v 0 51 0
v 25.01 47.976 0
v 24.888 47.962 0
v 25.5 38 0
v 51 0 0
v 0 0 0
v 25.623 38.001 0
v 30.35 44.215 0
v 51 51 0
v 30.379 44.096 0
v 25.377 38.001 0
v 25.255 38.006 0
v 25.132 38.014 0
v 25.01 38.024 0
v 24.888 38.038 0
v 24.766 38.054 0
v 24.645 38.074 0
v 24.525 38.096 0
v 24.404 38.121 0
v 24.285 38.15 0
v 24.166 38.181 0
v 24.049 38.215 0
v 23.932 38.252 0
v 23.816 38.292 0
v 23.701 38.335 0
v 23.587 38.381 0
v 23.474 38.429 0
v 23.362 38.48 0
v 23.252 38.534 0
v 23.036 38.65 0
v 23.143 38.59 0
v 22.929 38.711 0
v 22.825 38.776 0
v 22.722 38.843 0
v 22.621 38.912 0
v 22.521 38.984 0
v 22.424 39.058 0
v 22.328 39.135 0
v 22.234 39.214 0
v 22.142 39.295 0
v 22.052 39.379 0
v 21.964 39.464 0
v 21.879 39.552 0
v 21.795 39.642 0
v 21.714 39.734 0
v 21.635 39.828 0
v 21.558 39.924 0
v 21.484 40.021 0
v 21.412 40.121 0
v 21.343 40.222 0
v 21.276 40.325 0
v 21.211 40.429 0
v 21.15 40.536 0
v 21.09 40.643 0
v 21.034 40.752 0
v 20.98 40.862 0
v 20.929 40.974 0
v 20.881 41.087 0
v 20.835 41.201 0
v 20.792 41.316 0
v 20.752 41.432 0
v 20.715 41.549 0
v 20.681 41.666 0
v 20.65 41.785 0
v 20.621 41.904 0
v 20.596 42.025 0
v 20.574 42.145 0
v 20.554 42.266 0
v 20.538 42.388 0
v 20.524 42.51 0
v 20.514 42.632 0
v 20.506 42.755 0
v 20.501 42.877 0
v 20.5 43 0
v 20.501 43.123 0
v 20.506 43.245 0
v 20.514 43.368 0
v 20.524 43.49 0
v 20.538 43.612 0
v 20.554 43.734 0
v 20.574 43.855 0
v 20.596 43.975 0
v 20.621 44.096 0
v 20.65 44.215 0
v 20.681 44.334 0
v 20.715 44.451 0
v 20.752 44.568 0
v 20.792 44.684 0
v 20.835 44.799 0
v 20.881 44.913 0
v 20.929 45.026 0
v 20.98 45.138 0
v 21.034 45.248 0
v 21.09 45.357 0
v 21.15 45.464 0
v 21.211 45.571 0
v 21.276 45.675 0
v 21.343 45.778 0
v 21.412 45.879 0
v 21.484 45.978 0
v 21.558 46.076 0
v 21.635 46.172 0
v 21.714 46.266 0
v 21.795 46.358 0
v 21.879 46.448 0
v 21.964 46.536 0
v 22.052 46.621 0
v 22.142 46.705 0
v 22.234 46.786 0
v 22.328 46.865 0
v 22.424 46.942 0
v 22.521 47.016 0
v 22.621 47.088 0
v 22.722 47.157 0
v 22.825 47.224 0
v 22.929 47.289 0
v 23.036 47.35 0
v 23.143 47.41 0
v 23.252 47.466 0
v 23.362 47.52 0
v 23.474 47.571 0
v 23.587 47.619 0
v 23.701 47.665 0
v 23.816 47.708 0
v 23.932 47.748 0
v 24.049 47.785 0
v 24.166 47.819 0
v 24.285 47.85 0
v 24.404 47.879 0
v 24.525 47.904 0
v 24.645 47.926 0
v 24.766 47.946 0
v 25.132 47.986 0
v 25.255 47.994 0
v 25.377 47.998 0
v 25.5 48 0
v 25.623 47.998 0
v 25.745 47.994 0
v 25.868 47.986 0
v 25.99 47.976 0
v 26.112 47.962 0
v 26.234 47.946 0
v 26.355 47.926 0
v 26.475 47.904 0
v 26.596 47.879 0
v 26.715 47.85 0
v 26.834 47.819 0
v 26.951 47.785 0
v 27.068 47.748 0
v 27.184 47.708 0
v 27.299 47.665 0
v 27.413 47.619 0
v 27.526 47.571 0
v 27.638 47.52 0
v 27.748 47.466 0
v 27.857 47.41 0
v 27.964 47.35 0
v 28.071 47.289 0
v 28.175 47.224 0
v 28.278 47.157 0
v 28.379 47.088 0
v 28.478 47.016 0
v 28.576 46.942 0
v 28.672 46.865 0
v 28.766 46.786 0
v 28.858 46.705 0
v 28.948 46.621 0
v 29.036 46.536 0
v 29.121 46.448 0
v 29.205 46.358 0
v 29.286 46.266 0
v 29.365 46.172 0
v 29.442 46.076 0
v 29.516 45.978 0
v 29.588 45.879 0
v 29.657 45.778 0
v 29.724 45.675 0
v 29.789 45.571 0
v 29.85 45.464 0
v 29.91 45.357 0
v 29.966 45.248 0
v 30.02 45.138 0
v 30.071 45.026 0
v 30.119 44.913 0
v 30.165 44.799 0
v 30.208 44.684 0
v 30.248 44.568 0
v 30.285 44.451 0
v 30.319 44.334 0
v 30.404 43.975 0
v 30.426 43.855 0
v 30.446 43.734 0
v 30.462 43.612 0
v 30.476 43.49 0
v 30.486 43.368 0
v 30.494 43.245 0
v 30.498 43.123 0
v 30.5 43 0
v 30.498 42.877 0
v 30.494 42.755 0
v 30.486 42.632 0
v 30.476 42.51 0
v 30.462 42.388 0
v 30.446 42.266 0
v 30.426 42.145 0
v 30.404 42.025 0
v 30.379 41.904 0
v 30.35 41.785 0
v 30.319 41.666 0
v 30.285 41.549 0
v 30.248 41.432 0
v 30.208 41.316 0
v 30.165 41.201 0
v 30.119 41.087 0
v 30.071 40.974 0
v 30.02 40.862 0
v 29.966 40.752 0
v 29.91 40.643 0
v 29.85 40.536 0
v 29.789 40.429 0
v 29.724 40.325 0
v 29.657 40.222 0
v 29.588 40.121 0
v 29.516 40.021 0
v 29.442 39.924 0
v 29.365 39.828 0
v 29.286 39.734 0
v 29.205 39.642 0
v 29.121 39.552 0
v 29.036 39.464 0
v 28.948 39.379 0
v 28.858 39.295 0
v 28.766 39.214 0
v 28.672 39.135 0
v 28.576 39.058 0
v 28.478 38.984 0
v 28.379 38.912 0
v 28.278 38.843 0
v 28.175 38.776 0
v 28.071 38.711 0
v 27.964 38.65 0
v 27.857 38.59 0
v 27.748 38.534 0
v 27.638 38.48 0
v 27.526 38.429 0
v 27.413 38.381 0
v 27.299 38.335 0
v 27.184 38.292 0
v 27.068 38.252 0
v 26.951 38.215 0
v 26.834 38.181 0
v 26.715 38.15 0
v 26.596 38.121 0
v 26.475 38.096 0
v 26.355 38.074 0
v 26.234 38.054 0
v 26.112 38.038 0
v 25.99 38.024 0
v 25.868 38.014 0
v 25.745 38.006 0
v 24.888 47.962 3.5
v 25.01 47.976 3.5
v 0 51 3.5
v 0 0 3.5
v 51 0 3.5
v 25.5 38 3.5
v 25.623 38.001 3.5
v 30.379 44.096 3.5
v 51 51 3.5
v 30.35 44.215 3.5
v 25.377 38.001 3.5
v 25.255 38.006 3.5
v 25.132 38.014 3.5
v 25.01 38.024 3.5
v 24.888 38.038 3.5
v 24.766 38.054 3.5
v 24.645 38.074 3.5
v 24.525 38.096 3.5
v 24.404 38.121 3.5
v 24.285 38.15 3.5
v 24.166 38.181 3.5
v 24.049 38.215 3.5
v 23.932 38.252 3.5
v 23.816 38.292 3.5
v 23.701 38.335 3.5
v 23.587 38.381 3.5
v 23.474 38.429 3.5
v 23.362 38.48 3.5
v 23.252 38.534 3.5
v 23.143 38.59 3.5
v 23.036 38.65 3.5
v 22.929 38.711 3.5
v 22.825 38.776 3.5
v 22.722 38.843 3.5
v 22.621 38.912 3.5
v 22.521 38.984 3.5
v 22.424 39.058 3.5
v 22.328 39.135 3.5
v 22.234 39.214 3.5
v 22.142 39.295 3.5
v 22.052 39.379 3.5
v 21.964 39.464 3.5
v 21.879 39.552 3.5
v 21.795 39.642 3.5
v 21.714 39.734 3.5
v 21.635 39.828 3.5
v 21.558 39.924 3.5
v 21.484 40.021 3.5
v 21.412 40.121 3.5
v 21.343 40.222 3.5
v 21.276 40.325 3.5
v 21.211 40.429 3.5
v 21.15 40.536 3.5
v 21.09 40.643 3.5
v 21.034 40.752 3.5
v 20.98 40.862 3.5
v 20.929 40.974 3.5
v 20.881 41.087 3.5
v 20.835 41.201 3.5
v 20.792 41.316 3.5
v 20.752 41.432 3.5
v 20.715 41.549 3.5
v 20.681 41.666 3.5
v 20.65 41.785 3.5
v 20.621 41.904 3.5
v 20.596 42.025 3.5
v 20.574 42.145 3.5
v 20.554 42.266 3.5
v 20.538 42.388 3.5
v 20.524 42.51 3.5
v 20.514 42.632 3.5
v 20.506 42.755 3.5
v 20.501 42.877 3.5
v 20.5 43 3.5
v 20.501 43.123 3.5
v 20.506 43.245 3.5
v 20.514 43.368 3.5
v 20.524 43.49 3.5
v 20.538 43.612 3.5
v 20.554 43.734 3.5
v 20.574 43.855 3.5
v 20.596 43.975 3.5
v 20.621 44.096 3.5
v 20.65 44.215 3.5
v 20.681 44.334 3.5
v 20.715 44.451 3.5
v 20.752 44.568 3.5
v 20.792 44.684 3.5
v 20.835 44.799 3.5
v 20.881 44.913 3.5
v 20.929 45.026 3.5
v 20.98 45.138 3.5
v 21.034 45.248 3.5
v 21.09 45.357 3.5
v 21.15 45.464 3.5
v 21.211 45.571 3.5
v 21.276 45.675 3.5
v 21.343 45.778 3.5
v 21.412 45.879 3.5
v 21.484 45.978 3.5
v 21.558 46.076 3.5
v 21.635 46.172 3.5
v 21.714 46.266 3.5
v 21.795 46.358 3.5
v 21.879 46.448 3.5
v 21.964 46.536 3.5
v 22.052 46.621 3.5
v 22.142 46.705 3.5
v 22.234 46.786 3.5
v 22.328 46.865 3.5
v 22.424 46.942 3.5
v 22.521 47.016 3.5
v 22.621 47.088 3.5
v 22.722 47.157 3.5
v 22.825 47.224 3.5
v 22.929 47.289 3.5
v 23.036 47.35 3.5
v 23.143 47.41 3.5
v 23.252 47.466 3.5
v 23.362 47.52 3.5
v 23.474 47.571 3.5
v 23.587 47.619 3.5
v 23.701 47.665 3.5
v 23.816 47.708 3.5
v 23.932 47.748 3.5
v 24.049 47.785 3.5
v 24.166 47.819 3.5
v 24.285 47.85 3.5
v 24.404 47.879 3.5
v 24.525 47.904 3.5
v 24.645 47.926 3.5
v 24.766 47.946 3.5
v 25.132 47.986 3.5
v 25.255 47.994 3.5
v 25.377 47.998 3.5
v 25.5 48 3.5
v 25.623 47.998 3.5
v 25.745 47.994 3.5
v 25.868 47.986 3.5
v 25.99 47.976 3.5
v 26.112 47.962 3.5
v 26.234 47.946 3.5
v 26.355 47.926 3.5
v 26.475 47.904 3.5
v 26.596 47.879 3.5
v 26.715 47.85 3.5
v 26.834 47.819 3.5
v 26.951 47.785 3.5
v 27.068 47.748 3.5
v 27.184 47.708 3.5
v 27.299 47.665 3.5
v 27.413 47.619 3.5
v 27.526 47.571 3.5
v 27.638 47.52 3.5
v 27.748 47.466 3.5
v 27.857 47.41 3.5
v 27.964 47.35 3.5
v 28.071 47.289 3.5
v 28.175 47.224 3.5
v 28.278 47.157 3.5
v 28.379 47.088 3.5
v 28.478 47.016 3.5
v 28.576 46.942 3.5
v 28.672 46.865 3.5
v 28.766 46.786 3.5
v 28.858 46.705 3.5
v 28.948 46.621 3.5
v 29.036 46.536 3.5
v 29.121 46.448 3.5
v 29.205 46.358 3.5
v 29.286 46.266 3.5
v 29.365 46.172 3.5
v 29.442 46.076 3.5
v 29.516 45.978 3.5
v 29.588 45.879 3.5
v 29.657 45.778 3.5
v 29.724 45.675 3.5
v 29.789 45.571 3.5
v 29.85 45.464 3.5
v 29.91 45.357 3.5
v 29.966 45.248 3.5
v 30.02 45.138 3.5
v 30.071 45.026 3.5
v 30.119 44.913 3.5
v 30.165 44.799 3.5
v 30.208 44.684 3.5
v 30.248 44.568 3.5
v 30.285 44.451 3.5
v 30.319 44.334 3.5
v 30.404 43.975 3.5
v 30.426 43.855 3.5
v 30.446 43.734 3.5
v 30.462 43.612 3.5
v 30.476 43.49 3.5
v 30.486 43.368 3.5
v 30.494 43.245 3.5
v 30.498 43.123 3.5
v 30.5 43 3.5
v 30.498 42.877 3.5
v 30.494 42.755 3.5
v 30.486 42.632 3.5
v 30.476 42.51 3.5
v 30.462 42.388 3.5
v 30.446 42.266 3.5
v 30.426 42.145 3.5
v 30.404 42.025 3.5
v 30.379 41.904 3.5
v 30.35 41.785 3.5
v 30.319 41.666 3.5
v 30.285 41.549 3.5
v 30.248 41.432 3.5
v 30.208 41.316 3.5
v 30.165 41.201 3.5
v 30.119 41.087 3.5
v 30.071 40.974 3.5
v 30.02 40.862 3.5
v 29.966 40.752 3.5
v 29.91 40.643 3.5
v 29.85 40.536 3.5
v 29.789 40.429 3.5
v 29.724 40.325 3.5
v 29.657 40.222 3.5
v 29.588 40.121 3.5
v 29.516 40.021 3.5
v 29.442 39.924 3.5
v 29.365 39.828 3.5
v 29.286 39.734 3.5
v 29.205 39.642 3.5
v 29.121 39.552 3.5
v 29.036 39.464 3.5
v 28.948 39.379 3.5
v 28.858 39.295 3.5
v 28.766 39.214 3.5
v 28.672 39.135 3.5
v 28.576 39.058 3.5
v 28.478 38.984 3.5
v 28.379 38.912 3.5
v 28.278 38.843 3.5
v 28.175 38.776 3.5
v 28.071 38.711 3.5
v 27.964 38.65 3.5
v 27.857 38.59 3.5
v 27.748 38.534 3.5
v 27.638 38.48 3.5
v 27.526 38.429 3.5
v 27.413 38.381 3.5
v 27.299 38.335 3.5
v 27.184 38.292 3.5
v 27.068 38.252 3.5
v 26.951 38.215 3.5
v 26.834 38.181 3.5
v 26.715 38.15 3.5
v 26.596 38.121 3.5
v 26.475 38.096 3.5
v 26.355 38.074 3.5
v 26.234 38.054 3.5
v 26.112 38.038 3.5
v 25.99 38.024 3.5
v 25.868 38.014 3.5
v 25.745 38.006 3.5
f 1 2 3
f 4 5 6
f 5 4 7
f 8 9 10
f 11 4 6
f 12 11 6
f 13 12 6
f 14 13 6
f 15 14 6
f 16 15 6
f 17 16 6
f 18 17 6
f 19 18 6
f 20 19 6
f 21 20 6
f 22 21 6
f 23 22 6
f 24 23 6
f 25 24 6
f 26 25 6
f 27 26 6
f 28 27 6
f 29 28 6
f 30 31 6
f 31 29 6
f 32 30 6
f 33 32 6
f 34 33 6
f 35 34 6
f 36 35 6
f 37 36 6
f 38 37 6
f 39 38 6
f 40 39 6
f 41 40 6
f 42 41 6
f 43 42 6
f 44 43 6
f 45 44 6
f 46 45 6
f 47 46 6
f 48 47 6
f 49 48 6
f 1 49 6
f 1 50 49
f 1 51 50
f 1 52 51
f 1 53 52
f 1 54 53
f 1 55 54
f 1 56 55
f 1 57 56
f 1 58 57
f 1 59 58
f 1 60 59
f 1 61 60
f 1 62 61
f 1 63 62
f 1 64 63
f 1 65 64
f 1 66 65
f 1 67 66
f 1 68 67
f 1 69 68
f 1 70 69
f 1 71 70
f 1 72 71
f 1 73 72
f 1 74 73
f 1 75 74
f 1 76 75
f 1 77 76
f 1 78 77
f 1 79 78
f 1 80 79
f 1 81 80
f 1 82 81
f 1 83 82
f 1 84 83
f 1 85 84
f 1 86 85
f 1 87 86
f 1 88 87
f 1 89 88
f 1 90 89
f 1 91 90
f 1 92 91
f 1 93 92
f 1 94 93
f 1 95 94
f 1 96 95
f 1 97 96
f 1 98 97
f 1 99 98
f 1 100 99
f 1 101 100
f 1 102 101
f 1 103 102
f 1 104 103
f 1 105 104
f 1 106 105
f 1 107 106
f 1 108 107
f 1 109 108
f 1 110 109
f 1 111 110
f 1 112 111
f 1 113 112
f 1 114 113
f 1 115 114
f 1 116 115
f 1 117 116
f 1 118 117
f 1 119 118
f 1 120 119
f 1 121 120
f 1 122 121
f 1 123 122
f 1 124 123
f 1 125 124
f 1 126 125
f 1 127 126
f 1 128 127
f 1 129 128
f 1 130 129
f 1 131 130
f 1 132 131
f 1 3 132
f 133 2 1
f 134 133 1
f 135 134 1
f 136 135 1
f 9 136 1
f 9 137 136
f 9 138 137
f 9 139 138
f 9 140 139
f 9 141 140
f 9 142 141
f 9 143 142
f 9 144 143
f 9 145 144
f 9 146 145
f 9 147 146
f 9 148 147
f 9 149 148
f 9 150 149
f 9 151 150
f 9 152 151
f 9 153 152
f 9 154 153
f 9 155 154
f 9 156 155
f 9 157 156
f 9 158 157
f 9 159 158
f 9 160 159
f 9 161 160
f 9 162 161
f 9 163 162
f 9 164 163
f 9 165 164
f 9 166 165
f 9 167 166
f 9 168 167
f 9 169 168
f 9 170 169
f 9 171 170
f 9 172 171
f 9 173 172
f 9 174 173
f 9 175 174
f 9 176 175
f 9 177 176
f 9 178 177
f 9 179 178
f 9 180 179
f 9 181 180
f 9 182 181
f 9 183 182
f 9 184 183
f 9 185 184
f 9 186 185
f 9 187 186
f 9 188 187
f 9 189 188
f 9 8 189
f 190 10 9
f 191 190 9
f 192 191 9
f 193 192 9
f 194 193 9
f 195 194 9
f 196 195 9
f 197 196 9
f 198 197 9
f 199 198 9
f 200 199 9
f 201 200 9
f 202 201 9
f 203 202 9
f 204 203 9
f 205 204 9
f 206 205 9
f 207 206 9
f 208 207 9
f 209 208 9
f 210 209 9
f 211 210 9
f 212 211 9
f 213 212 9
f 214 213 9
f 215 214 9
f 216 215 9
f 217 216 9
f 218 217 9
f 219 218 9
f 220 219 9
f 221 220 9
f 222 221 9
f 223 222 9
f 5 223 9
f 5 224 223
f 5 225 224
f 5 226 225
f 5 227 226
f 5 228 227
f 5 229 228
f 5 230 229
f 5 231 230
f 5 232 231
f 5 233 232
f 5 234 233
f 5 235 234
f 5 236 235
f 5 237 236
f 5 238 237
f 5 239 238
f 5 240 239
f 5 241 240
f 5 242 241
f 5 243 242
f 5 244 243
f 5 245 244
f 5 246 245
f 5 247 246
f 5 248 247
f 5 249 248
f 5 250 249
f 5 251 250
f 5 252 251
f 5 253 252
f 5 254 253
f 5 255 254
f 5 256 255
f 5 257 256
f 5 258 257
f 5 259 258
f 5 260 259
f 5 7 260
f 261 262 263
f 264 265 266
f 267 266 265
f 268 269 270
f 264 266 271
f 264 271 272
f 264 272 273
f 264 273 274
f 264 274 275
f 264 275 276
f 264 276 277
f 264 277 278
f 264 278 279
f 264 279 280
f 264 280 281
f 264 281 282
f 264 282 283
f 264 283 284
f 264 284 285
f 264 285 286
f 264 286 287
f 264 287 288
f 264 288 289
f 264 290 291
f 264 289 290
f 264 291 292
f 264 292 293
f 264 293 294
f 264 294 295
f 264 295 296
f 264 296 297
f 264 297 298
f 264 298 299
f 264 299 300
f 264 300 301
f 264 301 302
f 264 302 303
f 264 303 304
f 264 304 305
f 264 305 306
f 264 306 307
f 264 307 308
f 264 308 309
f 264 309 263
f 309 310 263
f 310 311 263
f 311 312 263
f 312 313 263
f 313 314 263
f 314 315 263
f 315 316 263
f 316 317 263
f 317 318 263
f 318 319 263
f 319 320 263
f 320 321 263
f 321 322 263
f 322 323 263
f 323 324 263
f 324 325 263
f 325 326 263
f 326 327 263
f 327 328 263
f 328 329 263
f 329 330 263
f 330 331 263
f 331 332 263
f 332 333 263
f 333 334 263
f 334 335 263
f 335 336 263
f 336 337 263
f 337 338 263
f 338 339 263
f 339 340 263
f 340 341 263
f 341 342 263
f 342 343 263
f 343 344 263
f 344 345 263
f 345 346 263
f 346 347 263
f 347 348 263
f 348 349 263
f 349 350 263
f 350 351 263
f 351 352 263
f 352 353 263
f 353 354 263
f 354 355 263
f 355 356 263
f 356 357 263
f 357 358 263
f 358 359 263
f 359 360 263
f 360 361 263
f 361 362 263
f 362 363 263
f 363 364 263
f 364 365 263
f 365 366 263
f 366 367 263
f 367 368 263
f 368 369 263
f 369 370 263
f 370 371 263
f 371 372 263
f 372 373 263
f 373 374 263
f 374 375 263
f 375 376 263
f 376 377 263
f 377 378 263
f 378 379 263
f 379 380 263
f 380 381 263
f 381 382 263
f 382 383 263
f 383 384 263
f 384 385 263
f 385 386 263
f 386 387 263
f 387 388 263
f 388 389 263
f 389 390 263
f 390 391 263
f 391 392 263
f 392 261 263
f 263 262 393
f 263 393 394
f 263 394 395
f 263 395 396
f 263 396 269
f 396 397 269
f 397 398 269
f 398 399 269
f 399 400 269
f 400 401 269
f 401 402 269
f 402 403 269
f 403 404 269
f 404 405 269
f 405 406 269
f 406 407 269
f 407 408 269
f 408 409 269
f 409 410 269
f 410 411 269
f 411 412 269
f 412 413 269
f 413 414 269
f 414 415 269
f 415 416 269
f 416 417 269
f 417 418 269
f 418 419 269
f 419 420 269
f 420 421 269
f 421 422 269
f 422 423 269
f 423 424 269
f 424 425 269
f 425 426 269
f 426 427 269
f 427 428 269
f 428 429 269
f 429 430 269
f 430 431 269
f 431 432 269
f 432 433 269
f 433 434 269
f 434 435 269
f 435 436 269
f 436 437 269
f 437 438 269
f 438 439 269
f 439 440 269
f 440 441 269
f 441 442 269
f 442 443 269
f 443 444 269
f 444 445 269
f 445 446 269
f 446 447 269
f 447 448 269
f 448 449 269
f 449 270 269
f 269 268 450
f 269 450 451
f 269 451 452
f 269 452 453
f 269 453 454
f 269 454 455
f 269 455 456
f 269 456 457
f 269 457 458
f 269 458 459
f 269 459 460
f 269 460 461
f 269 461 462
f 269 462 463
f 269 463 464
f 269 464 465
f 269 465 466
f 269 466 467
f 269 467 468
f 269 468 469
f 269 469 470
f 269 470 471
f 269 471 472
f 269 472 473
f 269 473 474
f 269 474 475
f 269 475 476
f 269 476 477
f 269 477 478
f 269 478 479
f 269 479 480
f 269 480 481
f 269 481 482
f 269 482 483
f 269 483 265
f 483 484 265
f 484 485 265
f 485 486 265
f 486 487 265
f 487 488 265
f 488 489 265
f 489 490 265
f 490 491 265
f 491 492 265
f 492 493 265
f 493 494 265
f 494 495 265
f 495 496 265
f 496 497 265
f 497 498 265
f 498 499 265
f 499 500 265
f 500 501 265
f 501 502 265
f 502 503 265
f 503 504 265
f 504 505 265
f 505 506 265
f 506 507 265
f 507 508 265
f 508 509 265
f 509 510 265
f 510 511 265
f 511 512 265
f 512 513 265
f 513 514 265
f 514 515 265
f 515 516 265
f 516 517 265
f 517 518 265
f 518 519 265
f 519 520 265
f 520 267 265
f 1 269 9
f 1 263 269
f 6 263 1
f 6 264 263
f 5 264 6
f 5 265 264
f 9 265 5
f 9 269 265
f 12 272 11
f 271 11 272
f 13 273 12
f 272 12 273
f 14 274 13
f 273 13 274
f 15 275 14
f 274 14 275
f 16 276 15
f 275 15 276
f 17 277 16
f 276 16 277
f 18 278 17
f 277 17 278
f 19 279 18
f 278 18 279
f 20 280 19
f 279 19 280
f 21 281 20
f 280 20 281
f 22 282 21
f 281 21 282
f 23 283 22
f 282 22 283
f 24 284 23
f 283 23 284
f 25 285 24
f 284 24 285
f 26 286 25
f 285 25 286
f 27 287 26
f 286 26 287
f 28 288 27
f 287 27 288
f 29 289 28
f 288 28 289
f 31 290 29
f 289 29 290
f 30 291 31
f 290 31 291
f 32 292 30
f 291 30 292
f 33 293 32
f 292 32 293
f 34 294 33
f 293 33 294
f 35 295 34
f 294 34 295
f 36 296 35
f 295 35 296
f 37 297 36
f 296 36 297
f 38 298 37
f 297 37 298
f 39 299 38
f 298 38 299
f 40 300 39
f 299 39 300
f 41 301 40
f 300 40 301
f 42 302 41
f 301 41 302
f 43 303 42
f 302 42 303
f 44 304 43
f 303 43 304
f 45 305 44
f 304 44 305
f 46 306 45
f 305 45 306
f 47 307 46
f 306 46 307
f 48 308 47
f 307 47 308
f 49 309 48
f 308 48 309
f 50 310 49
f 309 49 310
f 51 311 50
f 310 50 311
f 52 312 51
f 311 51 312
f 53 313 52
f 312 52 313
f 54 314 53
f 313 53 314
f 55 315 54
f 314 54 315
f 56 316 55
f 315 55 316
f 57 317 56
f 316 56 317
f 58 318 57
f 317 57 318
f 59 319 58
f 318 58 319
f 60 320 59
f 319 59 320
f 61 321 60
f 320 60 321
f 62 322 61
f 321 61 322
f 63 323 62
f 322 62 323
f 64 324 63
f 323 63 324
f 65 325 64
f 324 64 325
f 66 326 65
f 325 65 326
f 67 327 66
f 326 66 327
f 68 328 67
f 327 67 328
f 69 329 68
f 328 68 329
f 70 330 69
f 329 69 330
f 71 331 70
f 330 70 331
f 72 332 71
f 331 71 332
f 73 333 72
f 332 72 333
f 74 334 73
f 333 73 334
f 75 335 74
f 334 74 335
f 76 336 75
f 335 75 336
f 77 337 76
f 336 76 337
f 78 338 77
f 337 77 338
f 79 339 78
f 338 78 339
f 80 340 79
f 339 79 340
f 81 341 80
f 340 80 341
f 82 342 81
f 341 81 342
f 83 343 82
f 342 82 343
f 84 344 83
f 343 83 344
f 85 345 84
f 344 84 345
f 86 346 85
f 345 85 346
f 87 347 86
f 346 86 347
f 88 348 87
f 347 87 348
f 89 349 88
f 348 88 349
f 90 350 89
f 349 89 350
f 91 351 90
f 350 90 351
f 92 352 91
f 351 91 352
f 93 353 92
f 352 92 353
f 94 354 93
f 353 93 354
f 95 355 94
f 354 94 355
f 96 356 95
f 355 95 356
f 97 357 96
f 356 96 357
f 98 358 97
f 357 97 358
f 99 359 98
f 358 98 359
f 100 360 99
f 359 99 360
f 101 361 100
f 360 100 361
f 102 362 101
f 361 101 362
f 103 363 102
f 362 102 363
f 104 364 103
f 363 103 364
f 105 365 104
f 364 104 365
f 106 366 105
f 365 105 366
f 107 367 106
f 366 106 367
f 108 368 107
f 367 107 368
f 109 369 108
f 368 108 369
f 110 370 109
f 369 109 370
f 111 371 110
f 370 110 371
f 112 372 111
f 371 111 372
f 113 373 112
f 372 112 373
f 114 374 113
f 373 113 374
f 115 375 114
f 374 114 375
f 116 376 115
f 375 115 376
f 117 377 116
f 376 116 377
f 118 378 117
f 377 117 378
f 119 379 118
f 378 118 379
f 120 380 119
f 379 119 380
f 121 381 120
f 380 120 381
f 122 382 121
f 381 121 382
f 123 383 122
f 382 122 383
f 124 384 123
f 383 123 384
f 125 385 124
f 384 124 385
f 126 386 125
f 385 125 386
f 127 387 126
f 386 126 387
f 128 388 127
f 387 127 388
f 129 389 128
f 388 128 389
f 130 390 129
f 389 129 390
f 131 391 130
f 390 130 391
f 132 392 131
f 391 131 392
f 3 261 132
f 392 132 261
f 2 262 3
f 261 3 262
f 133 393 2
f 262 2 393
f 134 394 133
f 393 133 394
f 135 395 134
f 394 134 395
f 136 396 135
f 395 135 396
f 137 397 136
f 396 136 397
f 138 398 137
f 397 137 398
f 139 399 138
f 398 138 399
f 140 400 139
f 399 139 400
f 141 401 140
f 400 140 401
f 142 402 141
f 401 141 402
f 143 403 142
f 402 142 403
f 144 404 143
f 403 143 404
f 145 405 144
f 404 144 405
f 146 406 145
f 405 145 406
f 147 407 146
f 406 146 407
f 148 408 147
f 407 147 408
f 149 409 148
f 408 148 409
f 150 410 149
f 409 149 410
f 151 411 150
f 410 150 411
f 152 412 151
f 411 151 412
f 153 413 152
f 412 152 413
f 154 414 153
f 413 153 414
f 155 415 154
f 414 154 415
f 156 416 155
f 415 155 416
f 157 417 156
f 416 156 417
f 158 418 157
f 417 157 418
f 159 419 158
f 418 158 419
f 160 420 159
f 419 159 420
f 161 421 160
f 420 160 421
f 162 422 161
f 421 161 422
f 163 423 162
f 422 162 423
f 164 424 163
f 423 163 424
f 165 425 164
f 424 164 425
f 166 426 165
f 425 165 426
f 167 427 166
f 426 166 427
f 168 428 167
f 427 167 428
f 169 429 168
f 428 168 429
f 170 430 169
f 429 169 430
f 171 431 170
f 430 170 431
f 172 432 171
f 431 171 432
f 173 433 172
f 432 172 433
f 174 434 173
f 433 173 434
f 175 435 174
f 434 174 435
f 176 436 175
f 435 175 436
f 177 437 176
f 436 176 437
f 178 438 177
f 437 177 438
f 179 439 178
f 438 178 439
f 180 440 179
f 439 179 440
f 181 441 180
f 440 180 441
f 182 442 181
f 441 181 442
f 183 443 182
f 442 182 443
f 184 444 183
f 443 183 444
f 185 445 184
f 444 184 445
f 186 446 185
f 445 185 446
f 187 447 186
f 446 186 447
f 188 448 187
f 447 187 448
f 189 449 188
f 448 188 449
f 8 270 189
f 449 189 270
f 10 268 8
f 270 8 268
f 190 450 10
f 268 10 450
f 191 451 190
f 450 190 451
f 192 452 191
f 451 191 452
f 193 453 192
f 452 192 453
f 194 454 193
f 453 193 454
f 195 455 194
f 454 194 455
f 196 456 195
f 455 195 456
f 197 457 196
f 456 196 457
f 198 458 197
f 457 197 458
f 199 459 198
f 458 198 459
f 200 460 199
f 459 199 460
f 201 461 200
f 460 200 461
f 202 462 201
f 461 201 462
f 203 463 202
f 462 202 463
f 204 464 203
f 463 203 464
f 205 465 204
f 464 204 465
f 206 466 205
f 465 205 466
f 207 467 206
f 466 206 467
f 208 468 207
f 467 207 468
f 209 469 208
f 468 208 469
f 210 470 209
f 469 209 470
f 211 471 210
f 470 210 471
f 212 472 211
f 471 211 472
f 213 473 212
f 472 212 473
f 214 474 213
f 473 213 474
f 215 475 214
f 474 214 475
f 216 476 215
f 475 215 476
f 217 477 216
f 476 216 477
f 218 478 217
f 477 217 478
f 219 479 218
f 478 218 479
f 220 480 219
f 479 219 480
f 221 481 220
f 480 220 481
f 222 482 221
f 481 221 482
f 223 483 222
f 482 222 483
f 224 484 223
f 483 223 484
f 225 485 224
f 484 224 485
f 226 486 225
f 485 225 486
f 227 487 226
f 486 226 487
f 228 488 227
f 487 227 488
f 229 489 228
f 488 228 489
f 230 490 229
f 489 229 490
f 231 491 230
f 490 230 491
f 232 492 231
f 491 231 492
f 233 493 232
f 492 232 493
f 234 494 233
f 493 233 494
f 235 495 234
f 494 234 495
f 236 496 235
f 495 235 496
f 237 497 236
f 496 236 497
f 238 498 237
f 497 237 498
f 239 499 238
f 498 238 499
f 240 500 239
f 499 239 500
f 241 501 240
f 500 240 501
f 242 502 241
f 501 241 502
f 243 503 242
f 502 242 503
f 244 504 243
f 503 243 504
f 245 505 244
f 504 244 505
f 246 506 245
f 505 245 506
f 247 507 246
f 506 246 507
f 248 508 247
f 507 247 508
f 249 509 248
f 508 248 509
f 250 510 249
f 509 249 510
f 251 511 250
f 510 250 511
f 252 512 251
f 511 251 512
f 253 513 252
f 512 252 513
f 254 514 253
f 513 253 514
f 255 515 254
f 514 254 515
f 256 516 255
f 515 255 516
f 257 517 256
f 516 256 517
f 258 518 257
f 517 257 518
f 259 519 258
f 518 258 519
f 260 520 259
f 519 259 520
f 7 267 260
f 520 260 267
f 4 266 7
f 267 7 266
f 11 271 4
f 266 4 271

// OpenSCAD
$fn = 256;

x = 51;
y = 51;
holepos = [x/2,43];
holerad = 5;
height = 3.5;

linear_extrude(height) {
    difference() {
        square([51,51]);
        translate(holepos) {
            circle(r=holerad);
        }
    }
}
